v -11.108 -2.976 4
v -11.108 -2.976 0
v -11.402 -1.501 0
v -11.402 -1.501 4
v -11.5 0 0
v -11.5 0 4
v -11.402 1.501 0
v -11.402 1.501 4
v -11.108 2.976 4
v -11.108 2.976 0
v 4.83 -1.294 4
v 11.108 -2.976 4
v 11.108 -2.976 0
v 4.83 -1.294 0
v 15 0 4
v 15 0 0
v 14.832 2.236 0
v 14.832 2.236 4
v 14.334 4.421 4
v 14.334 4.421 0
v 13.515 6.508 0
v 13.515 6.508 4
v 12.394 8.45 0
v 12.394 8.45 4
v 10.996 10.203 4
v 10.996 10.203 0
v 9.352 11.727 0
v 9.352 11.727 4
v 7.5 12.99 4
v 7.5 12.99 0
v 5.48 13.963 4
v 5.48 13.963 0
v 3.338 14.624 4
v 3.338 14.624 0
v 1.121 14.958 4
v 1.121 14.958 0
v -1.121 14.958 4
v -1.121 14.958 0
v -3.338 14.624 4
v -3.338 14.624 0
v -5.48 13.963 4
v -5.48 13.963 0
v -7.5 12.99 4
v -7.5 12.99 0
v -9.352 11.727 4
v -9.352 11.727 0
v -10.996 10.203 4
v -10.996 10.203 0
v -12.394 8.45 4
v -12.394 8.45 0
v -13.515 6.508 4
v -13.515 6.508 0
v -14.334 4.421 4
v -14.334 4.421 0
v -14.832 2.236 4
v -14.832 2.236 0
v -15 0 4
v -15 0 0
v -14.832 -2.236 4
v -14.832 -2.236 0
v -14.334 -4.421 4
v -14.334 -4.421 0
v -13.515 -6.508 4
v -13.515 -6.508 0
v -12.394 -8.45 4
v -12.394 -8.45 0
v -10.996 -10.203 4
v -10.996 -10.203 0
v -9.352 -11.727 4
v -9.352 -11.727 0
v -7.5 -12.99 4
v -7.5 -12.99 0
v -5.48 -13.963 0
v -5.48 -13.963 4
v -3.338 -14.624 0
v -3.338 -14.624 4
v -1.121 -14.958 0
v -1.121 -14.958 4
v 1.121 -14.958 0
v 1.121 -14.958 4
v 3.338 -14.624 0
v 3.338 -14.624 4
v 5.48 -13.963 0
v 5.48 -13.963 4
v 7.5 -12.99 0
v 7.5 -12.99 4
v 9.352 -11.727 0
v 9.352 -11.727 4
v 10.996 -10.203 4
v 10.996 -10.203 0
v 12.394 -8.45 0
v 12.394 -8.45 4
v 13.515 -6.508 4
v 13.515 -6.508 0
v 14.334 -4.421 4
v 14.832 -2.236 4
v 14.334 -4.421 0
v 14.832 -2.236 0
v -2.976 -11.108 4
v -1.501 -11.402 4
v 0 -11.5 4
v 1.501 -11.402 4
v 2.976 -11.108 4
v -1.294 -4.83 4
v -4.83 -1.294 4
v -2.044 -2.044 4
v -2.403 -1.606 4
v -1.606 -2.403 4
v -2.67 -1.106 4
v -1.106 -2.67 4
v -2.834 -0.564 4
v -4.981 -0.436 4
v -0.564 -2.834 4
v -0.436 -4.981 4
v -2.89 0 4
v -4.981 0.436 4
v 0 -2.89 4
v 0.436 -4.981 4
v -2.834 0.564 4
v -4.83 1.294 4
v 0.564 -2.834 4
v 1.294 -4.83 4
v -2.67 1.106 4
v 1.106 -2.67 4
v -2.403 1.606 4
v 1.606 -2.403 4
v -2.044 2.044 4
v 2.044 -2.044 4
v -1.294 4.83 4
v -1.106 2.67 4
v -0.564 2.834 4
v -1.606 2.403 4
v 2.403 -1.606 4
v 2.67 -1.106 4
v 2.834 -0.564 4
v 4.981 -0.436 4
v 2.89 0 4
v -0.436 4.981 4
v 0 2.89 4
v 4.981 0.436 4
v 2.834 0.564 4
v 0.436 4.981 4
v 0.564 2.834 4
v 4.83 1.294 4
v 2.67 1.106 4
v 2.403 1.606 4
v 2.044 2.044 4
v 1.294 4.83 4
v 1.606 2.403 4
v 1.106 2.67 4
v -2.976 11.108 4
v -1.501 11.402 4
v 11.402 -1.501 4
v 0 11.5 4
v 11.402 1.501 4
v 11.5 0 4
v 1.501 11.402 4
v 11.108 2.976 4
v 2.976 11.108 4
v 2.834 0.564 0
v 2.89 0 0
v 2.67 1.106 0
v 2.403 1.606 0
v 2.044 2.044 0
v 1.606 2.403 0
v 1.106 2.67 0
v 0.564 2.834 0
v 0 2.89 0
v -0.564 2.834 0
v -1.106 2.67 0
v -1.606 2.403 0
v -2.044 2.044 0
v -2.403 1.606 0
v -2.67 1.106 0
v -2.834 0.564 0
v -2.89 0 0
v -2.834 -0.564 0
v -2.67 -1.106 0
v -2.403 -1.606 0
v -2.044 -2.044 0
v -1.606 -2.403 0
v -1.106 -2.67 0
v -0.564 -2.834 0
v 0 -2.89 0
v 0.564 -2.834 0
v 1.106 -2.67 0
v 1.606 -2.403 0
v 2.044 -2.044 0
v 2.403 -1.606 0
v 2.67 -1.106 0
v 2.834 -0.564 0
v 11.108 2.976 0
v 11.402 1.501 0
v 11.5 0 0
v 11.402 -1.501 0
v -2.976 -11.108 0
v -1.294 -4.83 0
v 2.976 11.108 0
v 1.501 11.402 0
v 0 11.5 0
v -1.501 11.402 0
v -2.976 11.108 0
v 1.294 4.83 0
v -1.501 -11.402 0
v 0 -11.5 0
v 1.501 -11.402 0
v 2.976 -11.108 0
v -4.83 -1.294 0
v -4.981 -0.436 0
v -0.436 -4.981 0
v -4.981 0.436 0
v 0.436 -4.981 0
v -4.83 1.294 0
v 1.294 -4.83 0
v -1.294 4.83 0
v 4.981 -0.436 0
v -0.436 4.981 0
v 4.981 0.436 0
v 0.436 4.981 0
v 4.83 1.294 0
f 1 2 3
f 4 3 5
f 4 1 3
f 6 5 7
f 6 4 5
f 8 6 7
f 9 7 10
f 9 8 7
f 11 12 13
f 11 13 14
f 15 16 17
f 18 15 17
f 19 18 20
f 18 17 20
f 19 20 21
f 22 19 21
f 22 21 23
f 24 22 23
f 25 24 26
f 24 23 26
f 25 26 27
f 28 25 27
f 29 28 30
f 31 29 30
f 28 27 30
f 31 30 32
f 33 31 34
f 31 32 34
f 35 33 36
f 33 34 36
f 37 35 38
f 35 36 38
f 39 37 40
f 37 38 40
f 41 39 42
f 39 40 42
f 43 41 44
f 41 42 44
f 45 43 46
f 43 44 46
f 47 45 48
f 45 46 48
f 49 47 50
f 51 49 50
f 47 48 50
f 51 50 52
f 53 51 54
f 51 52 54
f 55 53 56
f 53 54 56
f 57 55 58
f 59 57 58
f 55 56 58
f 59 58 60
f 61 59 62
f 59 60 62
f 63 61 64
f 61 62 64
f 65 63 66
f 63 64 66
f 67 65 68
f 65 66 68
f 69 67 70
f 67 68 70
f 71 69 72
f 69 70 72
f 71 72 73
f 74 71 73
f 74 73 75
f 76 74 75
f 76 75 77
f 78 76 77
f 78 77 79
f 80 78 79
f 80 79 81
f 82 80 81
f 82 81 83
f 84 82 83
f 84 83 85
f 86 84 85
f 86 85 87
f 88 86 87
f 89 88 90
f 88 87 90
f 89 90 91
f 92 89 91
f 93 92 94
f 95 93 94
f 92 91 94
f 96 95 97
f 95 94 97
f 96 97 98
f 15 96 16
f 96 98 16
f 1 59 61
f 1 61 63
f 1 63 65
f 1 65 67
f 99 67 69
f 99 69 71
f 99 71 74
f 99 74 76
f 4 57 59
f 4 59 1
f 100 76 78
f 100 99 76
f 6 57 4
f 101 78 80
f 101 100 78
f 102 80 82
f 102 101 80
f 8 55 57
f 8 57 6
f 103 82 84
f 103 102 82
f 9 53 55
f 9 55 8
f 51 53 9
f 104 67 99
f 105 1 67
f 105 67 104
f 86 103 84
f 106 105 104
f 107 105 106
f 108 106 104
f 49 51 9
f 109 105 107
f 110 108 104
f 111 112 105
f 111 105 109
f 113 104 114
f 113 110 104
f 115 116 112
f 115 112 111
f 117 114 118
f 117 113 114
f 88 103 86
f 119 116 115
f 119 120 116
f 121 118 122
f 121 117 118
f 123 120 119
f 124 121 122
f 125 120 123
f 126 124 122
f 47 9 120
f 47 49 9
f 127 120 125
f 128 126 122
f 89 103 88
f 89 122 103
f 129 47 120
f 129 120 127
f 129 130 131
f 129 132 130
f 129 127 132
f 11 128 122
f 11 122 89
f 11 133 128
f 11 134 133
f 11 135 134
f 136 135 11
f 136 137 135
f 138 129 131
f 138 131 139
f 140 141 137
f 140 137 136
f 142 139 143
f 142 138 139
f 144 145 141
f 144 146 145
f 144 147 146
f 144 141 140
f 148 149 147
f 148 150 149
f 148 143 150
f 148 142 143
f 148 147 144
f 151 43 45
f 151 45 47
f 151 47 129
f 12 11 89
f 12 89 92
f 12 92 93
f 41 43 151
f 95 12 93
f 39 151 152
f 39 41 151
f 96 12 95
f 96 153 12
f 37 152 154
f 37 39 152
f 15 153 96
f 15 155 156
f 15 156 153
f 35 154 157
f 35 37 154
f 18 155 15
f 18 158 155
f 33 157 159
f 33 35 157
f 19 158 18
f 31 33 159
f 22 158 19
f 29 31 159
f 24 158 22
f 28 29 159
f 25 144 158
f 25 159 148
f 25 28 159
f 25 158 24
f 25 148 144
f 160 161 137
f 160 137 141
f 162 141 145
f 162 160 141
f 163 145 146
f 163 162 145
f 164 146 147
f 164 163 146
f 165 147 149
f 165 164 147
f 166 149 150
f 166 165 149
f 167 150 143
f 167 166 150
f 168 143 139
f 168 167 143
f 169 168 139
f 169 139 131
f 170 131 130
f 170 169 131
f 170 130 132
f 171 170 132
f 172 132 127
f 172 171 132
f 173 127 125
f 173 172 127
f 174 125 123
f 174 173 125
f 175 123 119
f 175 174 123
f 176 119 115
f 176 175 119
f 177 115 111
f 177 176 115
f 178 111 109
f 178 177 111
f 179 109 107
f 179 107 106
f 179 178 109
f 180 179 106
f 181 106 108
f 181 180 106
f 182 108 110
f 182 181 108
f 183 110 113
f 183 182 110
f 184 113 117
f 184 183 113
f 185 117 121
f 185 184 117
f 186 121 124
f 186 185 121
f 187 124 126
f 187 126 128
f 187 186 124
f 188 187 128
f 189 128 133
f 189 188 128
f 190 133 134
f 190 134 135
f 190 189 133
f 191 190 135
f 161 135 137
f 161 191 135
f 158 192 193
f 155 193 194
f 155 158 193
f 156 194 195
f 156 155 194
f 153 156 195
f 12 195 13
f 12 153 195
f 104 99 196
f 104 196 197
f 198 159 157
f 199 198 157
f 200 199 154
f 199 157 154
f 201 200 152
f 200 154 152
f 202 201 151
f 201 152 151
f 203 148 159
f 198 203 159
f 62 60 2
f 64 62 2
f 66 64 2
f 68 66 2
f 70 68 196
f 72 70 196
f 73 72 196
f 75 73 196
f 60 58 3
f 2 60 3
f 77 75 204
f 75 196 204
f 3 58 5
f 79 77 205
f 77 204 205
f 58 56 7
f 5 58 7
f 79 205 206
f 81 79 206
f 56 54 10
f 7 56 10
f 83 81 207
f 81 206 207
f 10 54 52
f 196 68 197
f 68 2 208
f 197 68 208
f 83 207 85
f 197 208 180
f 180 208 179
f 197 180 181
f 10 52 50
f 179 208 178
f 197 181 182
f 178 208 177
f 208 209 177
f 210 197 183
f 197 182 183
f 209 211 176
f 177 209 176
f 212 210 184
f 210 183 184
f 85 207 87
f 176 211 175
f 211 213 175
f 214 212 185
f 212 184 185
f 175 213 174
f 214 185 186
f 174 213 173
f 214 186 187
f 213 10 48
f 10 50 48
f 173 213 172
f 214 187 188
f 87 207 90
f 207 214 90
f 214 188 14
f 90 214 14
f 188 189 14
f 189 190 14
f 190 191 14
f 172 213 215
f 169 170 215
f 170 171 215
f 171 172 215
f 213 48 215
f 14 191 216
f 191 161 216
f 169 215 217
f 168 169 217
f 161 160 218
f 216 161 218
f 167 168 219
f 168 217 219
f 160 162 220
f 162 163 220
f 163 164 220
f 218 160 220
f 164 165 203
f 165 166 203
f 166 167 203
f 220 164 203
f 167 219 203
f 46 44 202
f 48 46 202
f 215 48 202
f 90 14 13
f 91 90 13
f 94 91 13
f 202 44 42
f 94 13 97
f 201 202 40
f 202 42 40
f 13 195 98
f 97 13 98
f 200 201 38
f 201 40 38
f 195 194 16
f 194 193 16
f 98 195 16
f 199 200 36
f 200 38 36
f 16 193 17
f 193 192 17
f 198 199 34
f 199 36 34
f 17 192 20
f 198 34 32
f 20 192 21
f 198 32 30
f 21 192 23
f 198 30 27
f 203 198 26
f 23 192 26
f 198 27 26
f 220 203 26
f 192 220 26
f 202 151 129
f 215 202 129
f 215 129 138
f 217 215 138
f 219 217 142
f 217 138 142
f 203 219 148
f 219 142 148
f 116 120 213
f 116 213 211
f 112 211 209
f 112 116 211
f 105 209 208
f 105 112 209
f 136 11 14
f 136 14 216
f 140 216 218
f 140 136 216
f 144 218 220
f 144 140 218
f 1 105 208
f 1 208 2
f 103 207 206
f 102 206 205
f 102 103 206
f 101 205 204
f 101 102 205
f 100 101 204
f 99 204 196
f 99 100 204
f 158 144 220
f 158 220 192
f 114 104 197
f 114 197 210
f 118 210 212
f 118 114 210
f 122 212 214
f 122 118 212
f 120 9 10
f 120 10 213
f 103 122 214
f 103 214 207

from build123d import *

# Parameters (mm, degrees)
SCHIZZO1_R                   = 15
SCHIZZO1_R_2                 = 2.89
ESTRUSIONE_ESTRUSIONE1_DEPTH = 4
TAGLIO_ESTRUSIONE1_DEPTH     = 22.587033145


with BuildPart() as part:
    # Schizzo1 → Estrusione-Estrusione1 (new body)
    with BuildSketch(Plane.XY):
        Circle(SCHIZZO1_R)
        Circle(SCHIZZO1_R_2, mode=Mode.SUBTRACT)
    extrude(amount=ESTRUSIONE_ESTRUSIONE1_DEPTH)

    # Schizzo2 → Taglio-Estrusione1 (cut, through all)
    with BuildSketch(Plane.XY.offset(4)):
        with BuildLine():
            Line((-4.829629131, -1.294095226), (-11.108147002, -2.976419019))
            ThreePointArc((-11.108147002, -2.976419019), (-11.5, 0), (-11.108147002, 2.976419019))
            Line((-11.108147002, 2.976419019), (-4.829629131, 1.294095226))
            ThreePointArc((-4.829629131, 1.294095226), (-5, 0), (-4.829629131, -1.294095226))
        make_face()
        with BuildLine():
            Line((11.108147002, -2.976419019), (4.829629131, -1.294095226))
            ThreePointArc((4.829629131, -1.294095226), (5, 0), (4.829629131, 1.294095226))
            Line((4.829629131, 1.294095226), (11.108147002, 2.976419019))
            ThreePointArc((11.108147002, 2.976419019), (11.5, 0), (11.108147002, -2.976419019))
        make_face()
        with BuildLine():
            Line((-2.976419019, 11.108147002), (-1.294095226, 4.829629131))
            ThreePointArc((-1.294095226, 4.829629131), (0, 5), (1.294095226, 4.829629131))
            Line((1.294095226, 4.829629131), (2.976419019, 11.108147002))
            ThreePointArc((2.976419019, 11.108147002), (0, 11.5), (-2.976419019, 11.108147002))
        make_face()
        with BuildLine():
            Line((-2.976419019, -11.108147002), (-1.294095226, -4.829629131))
            ThreePointArc((-1.294095226, -4.829629131), (0, -5), (1.294095226, -4.829629131))
            Line((1.294095226, -4.829629131), (2.976419019, -11.108147002))
            ThreePointArc((2.976419019, -11.108147002), (0, -11.5), (-2.976419019, -11.108147002))
        make_face()
    extrude(amount=-TAGLIO_ESTRUSIONE1_DEPTH, mode=Mode.SUBTRACT)


solid = part.part
